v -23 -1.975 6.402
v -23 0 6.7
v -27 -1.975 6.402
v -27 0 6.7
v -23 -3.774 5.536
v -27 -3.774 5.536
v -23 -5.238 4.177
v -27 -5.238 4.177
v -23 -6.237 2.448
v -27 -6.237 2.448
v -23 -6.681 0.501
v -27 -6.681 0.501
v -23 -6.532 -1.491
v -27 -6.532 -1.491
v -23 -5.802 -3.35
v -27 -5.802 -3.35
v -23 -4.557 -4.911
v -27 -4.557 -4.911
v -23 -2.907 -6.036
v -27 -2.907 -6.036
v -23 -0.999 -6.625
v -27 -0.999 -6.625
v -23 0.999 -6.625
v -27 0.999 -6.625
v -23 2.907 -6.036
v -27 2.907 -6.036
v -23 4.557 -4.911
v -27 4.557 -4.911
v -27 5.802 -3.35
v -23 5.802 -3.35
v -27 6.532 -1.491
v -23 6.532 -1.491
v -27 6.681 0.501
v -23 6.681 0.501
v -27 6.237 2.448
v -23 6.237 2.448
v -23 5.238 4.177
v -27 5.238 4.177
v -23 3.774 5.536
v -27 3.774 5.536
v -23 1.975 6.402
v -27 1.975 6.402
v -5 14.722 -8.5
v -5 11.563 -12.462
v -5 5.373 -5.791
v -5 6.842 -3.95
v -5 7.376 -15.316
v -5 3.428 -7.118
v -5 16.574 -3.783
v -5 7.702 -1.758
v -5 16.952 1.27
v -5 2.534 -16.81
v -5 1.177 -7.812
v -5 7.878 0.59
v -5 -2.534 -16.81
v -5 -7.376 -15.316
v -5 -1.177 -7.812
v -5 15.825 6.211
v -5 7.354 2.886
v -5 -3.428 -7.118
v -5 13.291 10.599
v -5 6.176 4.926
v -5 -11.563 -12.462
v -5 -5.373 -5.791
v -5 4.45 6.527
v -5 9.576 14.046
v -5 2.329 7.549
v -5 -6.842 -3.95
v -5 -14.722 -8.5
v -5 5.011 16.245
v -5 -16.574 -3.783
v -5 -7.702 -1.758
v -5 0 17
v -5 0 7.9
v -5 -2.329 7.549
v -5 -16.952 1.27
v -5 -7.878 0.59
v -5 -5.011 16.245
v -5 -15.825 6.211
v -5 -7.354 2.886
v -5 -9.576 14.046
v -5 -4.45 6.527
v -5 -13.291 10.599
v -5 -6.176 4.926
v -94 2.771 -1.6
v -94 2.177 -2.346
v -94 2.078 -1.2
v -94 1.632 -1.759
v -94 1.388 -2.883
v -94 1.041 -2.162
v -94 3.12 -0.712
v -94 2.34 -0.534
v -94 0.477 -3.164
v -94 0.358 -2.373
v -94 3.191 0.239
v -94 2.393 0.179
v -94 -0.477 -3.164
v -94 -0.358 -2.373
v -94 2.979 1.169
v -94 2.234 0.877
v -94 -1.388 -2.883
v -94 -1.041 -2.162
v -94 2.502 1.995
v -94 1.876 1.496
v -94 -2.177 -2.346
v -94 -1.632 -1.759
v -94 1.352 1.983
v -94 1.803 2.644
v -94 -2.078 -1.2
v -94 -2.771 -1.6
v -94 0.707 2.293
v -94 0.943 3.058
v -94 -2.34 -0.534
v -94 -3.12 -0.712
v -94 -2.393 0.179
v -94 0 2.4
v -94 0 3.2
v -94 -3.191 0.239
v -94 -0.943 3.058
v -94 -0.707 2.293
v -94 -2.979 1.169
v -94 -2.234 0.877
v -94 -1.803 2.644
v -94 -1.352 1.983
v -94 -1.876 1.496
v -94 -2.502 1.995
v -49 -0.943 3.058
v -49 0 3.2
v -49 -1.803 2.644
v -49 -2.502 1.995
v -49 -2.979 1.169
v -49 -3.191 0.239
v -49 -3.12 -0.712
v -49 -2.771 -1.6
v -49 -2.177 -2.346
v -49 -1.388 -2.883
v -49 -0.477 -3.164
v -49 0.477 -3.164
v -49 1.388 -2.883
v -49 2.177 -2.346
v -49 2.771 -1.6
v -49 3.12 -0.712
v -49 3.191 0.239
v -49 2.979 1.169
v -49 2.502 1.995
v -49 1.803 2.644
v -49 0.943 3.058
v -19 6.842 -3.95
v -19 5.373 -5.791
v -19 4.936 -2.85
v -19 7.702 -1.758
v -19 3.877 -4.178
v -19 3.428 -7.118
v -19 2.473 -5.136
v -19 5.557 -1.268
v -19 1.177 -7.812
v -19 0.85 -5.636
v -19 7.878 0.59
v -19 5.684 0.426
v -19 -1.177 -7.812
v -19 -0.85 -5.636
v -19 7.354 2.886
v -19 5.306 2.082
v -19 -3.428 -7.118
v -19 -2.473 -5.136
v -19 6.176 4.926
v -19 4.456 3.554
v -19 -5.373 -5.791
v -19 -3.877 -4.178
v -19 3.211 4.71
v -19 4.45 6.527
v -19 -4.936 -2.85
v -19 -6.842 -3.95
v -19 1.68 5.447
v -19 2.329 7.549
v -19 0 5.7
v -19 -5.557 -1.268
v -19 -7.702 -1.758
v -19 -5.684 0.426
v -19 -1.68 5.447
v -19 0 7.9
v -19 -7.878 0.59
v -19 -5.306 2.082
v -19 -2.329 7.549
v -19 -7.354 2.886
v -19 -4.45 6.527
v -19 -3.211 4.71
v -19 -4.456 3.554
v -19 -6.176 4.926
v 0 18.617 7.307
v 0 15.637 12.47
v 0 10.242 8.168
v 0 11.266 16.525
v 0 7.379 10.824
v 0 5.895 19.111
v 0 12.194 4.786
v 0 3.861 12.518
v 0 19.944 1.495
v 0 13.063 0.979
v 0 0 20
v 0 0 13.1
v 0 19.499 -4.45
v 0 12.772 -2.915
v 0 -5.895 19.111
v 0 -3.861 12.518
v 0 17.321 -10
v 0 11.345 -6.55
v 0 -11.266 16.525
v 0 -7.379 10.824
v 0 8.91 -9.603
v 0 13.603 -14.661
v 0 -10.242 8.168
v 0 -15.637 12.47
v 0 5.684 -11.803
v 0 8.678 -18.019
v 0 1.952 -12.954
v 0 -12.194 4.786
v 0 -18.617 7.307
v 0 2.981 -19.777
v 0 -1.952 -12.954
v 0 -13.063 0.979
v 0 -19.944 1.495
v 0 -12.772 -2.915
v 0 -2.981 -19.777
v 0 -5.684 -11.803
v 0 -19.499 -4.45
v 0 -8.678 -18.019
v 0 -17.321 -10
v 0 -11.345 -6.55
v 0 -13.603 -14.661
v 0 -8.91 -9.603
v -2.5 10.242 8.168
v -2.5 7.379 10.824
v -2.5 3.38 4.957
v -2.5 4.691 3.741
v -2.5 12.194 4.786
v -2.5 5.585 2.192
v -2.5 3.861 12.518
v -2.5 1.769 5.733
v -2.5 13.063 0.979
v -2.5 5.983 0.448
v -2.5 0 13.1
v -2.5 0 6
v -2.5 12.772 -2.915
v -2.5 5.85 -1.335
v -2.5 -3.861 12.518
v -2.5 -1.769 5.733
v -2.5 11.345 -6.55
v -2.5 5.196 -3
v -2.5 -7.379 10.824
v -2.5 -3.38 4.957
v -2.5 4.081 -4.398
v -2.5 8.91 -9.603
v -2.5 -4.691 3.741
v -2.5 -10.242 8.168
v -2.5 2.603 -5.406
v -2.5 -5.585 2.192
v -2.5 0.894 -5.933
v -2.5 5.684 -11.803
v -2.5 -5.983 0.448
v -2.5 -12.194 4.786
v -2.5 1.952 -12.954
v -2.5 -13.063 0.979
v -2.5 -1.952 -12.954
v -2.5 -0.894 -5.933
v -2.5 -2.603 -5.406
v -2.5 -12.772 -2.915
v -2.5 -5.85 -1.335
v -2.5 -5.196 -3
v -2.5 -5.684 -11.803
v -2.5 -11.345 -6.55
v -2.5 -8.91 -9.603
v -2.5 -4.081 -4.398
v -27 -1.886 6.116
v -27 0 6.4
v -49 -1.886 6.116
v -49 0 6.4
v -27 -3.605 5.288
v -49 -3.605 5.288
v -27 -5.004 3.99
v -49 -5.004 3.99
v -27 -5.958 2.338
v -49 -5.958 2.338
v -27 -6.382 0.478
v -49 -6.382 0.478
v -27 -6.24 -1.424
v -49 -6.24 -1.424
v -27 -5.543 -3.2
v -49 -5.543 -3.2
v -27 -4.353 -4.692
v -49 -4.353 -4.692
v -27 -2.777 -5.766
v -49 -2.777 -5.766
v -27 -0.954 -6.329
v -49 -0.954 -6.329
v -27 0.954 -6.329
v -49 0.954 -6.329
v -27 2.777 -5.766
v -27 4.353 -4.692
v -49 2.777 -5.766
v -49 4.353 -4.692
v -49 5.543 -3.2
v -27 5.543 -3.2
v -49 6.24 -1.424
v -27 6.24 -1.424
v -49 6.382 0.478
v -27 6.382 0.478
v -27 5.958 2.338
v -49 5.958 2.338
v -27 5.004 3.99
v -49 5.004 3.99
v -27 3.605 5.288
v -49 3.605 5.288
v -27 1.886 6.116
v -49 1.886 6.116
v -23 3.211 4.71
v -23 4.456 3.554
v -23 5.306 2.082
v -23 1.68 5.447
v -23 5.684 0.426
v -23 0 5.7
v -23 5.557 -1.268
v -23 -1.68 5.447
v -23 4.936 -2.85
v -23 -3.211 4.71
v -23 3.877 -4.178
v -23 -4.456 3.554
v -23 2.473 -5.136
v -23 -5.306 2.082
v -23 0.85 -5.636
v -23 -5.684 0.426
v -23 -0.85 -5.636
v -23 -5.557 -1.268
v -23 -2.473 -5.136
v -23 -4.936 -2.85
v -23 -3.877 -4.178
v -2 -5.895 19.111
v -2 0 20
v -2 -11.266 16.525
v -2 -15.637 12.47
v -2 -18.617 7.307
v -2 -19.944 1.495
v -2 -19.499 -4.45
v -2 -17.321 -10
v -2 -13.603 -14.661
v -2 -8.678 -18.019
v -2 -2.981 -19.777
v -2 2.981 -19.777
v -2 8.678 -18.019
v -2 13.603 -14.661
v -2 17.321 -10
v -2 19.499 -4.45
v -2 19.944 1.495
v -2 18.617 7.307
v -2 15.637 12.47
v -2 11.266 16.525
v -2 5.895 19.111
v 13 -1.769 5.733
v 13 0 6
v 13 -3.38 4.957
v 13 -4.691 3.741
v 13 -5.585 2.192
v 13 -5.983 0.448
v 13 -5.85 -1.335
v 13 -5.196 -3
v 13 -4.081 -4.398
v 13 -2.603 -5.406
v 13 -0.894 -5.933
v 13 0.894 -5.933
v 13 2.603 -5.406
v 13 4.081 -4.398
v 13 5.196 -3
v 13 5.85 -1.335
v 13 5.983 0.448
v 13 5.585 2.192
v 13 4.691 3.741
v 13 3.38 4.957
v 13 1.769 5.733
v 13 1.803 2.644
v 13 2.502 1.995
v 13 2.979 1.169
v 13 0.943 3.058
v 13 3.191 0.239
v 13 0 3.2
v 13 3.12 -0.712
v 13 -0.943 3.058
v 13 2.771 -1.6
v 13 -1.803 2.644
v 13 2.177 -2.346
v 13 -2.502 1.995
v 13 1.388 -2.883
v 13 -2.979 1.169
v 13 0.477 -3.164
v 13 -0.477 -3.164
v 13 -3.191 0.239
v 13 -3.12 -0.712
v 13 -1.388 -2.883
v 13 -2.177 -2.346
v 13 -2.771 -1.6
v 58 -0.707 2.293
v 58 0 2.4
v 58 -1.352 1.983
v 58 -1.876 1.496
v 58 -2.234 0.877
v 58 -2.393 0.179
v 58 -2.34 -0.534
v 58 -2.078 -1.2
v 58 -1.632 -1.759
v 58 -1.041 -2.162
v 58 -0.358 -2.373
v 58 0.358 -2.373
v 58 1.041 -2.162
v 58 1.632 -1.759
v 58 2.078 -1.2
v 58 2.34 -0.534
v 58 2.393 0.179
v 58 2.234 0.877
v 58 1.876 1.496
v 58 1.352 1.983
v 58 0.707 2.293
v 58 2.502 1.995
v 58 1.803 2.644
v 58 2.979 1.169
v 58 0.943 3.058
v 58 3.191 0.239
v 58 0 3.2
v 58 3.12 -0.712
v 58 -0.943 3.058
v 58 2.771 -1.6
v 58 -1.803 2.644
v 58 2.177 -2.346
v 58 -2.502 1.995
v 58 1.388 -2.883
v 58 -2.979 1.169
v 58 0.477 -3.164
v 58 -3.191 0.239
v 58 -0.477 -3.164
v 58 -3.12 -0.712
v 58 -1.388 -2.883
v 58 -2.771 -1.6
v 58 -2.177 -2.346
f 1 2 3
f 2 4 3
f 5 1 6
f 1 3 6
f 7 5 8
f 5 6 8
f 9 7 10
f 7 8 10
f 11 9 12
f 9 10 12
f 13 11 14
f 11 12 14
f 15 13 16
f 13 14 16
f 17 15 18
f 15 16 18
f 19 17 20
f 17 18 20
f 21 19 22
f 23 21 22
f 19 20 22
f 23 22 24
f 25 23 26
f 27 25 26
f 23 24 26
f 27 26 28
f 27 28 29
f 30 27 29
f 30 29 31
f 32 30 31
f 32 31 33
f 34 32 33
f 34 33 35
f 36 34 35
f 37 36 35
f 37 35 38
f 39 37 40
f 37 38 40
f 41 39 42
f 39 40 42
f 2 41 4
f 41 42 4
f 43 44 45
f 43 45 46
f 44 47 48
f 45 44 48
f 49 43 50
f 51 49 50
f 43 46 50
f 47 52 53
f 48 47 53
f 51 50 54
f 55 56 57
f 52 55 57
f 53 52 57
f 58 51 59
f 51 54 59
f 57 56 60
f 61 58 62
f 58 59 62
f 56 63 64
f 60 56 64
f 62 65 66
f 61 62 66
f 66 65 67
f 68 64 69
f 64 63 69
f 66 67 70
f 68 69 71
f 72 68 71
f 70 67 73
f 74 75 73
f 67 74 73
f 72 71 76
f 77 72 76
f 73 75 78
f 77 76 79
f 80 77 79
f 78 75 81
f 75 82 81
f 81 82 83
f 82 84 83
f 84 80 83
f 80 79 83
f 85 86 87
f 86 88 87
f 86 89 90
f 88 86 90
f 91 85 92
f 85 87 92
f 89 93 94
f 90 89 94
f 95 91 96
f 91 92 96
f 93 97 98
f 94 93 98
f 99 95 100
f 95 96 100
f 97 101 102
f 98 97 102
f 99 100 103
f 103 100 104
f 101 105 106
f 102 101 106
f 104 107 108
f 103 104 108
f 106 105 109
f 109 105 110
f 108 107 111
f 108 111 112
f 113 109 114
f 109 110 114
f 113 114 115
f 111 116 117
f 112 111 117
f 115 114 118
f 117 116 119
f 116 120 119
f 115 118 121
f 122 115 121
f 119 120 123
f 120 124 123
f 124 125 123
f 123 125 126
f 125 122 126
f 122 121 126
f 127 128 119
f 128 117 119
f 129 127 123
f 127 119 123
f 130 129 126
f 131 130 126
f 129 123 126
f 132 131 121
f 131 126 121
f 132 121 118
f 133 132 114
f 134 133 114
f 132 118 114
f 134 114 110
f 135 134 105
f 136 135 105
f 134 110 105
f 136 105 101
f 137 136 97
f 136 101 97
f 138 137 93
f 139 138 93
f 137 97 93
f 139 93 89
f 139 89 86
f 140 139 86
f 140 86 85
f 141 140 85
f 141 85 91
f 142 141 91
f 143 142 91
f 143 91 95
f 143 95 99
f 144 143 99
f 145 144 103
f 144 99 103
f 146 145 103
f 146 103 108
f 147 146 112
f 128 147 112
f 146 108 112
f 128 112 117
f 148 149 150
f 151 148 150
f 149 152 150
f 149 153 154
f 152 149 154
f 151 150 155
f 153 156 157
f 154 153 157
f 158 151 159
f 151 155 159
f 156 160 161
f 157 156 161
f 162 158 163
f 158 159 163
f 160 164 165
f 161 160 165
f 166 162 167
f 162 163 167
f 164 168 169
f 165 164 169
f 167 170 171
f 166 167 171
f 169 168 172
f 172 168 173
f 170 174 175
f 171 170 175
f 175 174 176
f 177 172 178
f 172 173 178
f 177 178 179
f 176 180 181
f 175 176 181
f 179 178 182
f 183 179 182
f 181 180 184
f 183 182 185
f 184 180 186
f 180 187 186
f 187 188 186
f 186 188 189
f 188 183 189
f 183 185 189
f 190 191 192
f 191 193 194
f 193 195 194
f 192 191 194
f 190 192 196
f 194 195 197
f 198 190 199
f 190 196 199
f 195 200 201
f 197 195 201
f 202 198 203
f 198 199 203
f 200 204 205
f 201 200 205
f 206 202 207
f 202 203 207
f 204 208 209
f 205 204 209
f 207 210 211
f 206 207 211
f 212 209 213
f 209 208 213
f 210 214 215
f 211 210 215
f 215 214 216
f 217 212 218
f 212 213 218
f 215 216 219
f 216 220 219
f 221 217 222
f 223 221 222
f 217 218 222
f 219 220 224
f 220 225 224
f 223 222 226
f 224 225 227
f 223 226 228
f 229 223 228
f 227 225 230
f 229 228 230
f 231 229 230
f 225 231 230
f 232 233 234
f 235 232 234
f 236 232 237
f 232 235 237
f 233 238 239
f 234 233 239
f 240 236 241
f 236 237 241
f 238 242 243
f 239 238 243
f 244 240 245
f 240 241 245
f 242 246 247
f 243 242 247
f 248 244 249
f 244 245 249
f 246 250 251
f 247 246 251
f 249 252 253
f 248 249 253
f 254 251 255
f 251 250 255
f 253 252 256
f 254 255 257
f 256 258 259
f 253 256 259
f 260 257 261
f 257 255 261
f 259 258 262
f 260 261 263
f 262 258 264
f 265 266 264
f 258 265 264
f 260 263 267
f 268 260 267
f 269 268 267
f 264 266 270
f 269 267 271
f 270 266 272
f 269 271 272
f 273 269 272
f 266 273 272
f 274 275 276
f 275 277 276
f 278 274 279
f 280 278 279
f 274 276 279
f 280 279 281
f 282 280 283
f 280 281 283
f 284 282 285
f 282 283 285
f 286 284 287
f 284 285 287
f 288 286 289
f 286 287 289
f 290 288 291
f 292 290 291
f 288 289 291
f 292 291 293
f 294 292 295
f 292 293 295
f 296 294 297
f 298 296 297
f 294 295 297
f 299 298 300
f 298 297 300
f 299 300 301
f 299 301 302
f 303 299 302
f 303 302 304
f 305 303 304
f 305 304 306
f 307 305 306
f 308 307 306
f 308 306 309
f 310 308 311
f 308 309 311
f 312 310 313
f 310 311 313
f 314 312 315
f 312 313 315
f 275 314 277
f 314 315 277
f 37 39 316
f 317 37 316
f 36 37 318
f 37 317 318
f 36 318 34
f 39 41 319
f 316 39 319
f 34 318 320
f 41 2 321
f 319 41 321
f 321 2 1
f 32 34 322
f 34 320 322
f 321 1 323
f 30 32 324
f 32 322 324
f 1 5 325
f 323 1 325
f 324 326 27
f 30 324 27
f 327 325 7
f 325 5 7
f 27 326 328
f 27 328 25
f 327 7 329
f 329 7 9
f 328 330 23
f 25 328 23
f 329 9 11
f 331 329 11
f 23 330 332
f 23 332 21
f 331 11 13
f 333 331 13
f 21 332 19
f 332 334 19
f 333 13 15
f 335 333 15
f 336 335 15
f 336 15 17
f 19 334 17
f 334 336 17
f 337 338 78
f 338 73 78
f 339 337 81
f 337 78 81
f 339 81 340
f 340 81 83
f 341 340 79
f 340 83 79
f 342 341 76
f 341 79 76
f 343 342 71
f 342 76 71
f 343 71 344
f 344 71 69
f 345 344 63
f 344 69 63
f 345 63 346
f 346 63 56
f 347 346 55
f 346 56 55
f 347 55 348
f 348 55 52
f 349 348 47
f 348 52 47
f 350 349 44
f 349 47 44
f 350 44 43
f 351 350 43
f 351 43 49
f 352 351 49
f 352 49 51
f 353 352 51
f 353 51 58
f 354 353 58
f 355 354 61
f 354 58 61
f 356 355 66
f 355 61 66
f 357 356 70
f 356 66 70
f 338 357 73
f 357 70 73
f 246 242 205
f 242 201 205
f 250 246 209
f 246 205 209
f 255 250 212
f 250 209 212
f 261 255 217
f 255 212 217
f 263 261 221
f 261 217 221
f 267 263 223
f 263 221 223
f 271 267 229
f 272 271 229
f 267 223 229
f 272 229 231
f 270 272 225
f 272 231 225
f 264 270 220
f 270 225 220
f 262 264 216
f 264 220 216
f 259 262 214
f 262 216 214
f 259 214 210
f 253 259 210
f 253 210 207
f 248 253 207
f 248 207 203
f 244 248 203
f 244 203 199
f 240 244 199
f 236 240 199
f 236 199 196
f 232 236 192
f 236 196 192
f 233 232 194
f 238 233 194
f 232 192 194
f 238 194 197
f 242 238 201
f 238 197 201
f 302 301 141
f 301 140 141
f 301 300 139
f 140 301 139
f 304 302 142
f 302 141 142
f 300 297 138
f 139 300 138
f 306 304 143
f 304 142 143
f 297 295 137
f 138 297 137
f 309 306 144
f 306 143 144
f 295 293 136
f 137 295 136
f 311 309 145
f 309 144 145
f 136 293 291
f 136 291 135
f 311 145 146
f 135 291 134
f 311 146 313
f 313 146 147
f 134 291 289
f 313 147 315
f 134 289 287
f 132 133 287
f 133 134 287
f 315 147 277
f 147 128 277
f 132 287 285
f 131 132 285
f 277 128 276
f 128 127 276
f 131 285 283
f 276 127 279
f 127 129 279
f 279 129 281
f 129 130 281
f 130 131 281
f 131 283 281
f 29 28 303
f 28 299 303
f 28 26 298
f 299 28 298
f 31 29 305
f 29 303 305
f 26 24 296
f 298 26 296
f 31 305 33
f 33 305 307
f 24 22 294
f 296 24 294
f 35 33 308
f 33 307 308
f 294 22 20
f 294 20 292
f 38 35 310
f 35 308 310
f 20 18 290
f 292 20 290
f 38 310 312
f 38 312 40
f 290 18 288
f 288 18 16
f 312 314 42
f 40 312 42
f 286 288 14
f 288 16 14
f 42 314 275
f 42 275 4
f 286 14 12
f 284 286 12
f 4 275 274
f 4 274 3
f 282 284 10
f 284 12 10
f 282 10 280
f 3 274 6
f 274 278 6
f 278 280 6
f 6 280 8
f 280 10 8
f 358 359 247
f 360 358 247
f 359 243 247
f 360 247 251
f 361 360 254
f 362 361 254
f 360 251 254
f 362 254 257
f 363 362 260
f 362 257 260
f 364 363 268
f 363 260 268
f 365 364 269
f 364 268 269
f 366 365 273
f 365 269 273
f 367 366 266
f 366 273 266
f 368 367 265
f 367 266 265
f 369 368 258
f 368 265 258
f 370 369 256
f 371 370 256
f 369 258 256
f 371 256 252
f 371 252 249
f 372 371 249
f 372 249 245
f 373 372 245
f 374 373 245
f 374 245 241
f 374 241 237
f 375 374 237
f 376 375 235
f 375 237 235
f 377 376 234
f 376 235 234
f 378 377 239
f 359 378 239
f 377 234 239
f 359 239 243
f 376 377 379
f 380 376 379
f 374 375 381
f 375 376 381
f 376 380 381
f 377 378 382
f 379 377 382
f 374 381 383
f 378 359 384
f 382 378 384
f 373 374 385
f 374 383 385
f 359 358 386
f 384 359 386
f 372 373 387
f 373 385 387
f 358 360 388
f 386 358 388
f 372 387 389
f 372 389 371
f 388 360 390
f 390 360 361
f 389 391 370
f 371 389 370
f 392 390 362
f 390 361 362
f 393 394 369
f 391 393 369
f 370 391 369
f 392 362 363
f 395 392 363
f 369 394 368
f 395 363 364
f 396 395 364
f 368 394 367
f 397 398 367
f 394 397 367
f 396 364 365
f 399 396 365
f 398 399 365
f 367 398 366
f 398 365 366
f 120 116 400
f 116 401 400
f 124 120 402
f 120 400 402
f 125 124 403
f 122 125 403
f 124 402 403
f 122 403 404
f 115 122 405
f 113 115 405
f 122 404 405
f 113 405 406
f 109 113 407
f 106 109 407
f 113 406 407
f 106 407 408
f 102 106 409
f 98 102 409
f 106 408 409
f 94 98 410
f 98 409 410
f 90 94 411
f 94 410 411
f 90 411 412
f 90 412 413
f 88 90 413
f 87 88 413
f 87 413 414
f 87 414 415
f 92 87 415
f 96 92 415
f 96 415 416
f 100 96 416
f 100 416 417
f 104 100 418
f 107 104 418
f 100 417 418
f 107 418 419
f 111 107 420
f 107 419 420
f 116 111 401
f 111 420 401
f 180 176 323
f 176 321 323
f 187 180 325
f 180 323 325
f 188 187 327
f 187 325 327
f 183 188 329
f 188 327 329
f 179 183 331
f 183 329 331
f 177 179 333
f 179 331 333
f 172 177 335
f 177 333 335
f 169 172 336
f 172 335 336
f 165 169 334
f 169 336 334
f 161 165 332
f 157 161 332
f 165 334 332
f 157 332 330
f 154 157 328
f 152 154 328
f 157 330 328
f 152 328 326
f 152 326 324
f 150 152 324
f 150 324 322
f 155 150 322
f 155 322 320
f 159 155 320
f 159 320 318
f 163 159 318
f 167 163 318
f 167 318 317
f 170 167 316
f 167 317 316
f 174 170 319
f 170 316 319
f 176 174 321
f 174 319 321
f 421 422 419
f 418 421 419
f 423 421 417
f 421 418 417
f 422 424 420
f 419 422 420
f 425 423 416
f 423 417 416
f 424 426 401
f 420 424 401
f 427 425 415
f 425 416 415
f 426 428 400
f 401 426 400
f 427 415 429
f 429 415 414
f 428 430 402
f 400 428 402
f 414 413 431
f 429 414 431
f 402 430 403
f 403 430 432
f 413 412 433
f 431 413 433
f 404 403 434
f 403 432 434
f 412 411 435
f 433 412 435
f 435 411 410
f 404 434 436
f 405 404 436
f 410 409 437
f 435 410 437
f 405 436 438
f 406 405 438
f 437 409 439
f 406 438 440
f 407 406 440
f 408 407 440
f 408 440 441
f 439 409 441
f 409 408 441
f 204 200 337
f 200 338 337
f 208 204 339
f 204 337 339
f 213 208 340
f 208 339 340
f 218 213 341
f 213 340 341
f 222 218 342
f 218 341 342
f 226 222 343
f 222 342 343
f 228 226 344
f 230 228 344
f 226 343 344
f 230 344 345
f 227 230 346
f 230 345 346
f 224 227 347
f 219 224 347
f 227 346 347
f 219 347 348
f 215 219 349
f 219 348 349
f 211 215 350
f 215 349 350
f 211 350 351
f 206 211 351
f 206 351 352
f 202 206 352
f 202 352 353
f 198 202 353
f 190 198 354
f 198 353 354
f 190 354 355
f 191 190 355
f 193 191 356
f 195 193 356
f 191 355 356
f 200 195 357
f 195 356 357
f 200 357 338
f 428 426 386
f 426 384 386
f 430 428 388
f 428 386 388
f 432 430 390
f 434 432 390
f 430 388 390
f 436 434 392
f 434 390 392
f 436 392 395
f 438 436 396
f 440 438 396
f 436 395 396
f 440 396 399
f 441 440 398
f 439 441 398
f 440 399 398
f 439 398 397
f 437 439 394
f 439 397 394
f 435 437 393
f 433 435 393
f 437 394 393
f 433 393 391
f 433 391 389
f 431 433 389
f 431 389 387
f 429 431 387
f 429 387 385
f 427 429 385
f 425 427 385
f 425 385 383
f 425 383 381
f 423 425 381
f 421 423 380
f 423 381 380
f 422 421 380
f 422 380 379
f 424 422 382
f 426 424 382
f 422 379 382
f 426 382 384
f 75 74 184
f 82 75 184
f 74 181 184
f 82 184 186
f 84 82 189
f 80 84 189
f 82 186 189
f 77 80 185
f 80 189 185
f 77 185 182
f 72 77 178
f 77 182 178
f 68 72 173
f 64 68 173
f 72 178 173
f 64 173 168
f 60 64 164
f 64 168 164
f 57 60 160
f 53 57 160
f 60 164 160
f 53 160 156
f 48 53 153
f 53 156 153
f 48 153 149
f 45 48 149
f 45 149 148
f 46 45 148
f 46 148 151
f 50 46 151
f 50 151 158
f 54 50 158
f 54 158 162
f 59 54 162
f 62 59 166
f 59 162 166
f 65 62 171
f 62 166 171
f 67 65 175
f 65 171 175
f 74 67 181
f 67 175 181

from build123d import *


with BuildPart() as part:
    # Axial profile (mm) → Full revolution (revolve)
    with BuildSketch(Plane.XY, mode=Mode.PRIVATE) as full_revolution_sk:
        Polygon((-94, 2.4), (58, 2.4), (58, 3.2), (13, 3.2), (13, 6), (-2.5, 6), (-2.5, 13.1), (0, 13.1), (0, 20), (-2, 20), (-5, 17), (-5, 7.9), (-19, 7.9), (-19, 5.7), (-23, 5.7), (-23, 6.7), (-27, 6.7), (-27, 6.4), (-49, 6.4), (-49, 3.2), (-94, 3.2), align=None)
    revolve(full_revolution_sk.sketch.rotate(Axis((-110, 0, 0), (1, 0, 0)), 90), axis=Axis((-110, 0, 0), (1, 0, 0)))


solid = part.part
